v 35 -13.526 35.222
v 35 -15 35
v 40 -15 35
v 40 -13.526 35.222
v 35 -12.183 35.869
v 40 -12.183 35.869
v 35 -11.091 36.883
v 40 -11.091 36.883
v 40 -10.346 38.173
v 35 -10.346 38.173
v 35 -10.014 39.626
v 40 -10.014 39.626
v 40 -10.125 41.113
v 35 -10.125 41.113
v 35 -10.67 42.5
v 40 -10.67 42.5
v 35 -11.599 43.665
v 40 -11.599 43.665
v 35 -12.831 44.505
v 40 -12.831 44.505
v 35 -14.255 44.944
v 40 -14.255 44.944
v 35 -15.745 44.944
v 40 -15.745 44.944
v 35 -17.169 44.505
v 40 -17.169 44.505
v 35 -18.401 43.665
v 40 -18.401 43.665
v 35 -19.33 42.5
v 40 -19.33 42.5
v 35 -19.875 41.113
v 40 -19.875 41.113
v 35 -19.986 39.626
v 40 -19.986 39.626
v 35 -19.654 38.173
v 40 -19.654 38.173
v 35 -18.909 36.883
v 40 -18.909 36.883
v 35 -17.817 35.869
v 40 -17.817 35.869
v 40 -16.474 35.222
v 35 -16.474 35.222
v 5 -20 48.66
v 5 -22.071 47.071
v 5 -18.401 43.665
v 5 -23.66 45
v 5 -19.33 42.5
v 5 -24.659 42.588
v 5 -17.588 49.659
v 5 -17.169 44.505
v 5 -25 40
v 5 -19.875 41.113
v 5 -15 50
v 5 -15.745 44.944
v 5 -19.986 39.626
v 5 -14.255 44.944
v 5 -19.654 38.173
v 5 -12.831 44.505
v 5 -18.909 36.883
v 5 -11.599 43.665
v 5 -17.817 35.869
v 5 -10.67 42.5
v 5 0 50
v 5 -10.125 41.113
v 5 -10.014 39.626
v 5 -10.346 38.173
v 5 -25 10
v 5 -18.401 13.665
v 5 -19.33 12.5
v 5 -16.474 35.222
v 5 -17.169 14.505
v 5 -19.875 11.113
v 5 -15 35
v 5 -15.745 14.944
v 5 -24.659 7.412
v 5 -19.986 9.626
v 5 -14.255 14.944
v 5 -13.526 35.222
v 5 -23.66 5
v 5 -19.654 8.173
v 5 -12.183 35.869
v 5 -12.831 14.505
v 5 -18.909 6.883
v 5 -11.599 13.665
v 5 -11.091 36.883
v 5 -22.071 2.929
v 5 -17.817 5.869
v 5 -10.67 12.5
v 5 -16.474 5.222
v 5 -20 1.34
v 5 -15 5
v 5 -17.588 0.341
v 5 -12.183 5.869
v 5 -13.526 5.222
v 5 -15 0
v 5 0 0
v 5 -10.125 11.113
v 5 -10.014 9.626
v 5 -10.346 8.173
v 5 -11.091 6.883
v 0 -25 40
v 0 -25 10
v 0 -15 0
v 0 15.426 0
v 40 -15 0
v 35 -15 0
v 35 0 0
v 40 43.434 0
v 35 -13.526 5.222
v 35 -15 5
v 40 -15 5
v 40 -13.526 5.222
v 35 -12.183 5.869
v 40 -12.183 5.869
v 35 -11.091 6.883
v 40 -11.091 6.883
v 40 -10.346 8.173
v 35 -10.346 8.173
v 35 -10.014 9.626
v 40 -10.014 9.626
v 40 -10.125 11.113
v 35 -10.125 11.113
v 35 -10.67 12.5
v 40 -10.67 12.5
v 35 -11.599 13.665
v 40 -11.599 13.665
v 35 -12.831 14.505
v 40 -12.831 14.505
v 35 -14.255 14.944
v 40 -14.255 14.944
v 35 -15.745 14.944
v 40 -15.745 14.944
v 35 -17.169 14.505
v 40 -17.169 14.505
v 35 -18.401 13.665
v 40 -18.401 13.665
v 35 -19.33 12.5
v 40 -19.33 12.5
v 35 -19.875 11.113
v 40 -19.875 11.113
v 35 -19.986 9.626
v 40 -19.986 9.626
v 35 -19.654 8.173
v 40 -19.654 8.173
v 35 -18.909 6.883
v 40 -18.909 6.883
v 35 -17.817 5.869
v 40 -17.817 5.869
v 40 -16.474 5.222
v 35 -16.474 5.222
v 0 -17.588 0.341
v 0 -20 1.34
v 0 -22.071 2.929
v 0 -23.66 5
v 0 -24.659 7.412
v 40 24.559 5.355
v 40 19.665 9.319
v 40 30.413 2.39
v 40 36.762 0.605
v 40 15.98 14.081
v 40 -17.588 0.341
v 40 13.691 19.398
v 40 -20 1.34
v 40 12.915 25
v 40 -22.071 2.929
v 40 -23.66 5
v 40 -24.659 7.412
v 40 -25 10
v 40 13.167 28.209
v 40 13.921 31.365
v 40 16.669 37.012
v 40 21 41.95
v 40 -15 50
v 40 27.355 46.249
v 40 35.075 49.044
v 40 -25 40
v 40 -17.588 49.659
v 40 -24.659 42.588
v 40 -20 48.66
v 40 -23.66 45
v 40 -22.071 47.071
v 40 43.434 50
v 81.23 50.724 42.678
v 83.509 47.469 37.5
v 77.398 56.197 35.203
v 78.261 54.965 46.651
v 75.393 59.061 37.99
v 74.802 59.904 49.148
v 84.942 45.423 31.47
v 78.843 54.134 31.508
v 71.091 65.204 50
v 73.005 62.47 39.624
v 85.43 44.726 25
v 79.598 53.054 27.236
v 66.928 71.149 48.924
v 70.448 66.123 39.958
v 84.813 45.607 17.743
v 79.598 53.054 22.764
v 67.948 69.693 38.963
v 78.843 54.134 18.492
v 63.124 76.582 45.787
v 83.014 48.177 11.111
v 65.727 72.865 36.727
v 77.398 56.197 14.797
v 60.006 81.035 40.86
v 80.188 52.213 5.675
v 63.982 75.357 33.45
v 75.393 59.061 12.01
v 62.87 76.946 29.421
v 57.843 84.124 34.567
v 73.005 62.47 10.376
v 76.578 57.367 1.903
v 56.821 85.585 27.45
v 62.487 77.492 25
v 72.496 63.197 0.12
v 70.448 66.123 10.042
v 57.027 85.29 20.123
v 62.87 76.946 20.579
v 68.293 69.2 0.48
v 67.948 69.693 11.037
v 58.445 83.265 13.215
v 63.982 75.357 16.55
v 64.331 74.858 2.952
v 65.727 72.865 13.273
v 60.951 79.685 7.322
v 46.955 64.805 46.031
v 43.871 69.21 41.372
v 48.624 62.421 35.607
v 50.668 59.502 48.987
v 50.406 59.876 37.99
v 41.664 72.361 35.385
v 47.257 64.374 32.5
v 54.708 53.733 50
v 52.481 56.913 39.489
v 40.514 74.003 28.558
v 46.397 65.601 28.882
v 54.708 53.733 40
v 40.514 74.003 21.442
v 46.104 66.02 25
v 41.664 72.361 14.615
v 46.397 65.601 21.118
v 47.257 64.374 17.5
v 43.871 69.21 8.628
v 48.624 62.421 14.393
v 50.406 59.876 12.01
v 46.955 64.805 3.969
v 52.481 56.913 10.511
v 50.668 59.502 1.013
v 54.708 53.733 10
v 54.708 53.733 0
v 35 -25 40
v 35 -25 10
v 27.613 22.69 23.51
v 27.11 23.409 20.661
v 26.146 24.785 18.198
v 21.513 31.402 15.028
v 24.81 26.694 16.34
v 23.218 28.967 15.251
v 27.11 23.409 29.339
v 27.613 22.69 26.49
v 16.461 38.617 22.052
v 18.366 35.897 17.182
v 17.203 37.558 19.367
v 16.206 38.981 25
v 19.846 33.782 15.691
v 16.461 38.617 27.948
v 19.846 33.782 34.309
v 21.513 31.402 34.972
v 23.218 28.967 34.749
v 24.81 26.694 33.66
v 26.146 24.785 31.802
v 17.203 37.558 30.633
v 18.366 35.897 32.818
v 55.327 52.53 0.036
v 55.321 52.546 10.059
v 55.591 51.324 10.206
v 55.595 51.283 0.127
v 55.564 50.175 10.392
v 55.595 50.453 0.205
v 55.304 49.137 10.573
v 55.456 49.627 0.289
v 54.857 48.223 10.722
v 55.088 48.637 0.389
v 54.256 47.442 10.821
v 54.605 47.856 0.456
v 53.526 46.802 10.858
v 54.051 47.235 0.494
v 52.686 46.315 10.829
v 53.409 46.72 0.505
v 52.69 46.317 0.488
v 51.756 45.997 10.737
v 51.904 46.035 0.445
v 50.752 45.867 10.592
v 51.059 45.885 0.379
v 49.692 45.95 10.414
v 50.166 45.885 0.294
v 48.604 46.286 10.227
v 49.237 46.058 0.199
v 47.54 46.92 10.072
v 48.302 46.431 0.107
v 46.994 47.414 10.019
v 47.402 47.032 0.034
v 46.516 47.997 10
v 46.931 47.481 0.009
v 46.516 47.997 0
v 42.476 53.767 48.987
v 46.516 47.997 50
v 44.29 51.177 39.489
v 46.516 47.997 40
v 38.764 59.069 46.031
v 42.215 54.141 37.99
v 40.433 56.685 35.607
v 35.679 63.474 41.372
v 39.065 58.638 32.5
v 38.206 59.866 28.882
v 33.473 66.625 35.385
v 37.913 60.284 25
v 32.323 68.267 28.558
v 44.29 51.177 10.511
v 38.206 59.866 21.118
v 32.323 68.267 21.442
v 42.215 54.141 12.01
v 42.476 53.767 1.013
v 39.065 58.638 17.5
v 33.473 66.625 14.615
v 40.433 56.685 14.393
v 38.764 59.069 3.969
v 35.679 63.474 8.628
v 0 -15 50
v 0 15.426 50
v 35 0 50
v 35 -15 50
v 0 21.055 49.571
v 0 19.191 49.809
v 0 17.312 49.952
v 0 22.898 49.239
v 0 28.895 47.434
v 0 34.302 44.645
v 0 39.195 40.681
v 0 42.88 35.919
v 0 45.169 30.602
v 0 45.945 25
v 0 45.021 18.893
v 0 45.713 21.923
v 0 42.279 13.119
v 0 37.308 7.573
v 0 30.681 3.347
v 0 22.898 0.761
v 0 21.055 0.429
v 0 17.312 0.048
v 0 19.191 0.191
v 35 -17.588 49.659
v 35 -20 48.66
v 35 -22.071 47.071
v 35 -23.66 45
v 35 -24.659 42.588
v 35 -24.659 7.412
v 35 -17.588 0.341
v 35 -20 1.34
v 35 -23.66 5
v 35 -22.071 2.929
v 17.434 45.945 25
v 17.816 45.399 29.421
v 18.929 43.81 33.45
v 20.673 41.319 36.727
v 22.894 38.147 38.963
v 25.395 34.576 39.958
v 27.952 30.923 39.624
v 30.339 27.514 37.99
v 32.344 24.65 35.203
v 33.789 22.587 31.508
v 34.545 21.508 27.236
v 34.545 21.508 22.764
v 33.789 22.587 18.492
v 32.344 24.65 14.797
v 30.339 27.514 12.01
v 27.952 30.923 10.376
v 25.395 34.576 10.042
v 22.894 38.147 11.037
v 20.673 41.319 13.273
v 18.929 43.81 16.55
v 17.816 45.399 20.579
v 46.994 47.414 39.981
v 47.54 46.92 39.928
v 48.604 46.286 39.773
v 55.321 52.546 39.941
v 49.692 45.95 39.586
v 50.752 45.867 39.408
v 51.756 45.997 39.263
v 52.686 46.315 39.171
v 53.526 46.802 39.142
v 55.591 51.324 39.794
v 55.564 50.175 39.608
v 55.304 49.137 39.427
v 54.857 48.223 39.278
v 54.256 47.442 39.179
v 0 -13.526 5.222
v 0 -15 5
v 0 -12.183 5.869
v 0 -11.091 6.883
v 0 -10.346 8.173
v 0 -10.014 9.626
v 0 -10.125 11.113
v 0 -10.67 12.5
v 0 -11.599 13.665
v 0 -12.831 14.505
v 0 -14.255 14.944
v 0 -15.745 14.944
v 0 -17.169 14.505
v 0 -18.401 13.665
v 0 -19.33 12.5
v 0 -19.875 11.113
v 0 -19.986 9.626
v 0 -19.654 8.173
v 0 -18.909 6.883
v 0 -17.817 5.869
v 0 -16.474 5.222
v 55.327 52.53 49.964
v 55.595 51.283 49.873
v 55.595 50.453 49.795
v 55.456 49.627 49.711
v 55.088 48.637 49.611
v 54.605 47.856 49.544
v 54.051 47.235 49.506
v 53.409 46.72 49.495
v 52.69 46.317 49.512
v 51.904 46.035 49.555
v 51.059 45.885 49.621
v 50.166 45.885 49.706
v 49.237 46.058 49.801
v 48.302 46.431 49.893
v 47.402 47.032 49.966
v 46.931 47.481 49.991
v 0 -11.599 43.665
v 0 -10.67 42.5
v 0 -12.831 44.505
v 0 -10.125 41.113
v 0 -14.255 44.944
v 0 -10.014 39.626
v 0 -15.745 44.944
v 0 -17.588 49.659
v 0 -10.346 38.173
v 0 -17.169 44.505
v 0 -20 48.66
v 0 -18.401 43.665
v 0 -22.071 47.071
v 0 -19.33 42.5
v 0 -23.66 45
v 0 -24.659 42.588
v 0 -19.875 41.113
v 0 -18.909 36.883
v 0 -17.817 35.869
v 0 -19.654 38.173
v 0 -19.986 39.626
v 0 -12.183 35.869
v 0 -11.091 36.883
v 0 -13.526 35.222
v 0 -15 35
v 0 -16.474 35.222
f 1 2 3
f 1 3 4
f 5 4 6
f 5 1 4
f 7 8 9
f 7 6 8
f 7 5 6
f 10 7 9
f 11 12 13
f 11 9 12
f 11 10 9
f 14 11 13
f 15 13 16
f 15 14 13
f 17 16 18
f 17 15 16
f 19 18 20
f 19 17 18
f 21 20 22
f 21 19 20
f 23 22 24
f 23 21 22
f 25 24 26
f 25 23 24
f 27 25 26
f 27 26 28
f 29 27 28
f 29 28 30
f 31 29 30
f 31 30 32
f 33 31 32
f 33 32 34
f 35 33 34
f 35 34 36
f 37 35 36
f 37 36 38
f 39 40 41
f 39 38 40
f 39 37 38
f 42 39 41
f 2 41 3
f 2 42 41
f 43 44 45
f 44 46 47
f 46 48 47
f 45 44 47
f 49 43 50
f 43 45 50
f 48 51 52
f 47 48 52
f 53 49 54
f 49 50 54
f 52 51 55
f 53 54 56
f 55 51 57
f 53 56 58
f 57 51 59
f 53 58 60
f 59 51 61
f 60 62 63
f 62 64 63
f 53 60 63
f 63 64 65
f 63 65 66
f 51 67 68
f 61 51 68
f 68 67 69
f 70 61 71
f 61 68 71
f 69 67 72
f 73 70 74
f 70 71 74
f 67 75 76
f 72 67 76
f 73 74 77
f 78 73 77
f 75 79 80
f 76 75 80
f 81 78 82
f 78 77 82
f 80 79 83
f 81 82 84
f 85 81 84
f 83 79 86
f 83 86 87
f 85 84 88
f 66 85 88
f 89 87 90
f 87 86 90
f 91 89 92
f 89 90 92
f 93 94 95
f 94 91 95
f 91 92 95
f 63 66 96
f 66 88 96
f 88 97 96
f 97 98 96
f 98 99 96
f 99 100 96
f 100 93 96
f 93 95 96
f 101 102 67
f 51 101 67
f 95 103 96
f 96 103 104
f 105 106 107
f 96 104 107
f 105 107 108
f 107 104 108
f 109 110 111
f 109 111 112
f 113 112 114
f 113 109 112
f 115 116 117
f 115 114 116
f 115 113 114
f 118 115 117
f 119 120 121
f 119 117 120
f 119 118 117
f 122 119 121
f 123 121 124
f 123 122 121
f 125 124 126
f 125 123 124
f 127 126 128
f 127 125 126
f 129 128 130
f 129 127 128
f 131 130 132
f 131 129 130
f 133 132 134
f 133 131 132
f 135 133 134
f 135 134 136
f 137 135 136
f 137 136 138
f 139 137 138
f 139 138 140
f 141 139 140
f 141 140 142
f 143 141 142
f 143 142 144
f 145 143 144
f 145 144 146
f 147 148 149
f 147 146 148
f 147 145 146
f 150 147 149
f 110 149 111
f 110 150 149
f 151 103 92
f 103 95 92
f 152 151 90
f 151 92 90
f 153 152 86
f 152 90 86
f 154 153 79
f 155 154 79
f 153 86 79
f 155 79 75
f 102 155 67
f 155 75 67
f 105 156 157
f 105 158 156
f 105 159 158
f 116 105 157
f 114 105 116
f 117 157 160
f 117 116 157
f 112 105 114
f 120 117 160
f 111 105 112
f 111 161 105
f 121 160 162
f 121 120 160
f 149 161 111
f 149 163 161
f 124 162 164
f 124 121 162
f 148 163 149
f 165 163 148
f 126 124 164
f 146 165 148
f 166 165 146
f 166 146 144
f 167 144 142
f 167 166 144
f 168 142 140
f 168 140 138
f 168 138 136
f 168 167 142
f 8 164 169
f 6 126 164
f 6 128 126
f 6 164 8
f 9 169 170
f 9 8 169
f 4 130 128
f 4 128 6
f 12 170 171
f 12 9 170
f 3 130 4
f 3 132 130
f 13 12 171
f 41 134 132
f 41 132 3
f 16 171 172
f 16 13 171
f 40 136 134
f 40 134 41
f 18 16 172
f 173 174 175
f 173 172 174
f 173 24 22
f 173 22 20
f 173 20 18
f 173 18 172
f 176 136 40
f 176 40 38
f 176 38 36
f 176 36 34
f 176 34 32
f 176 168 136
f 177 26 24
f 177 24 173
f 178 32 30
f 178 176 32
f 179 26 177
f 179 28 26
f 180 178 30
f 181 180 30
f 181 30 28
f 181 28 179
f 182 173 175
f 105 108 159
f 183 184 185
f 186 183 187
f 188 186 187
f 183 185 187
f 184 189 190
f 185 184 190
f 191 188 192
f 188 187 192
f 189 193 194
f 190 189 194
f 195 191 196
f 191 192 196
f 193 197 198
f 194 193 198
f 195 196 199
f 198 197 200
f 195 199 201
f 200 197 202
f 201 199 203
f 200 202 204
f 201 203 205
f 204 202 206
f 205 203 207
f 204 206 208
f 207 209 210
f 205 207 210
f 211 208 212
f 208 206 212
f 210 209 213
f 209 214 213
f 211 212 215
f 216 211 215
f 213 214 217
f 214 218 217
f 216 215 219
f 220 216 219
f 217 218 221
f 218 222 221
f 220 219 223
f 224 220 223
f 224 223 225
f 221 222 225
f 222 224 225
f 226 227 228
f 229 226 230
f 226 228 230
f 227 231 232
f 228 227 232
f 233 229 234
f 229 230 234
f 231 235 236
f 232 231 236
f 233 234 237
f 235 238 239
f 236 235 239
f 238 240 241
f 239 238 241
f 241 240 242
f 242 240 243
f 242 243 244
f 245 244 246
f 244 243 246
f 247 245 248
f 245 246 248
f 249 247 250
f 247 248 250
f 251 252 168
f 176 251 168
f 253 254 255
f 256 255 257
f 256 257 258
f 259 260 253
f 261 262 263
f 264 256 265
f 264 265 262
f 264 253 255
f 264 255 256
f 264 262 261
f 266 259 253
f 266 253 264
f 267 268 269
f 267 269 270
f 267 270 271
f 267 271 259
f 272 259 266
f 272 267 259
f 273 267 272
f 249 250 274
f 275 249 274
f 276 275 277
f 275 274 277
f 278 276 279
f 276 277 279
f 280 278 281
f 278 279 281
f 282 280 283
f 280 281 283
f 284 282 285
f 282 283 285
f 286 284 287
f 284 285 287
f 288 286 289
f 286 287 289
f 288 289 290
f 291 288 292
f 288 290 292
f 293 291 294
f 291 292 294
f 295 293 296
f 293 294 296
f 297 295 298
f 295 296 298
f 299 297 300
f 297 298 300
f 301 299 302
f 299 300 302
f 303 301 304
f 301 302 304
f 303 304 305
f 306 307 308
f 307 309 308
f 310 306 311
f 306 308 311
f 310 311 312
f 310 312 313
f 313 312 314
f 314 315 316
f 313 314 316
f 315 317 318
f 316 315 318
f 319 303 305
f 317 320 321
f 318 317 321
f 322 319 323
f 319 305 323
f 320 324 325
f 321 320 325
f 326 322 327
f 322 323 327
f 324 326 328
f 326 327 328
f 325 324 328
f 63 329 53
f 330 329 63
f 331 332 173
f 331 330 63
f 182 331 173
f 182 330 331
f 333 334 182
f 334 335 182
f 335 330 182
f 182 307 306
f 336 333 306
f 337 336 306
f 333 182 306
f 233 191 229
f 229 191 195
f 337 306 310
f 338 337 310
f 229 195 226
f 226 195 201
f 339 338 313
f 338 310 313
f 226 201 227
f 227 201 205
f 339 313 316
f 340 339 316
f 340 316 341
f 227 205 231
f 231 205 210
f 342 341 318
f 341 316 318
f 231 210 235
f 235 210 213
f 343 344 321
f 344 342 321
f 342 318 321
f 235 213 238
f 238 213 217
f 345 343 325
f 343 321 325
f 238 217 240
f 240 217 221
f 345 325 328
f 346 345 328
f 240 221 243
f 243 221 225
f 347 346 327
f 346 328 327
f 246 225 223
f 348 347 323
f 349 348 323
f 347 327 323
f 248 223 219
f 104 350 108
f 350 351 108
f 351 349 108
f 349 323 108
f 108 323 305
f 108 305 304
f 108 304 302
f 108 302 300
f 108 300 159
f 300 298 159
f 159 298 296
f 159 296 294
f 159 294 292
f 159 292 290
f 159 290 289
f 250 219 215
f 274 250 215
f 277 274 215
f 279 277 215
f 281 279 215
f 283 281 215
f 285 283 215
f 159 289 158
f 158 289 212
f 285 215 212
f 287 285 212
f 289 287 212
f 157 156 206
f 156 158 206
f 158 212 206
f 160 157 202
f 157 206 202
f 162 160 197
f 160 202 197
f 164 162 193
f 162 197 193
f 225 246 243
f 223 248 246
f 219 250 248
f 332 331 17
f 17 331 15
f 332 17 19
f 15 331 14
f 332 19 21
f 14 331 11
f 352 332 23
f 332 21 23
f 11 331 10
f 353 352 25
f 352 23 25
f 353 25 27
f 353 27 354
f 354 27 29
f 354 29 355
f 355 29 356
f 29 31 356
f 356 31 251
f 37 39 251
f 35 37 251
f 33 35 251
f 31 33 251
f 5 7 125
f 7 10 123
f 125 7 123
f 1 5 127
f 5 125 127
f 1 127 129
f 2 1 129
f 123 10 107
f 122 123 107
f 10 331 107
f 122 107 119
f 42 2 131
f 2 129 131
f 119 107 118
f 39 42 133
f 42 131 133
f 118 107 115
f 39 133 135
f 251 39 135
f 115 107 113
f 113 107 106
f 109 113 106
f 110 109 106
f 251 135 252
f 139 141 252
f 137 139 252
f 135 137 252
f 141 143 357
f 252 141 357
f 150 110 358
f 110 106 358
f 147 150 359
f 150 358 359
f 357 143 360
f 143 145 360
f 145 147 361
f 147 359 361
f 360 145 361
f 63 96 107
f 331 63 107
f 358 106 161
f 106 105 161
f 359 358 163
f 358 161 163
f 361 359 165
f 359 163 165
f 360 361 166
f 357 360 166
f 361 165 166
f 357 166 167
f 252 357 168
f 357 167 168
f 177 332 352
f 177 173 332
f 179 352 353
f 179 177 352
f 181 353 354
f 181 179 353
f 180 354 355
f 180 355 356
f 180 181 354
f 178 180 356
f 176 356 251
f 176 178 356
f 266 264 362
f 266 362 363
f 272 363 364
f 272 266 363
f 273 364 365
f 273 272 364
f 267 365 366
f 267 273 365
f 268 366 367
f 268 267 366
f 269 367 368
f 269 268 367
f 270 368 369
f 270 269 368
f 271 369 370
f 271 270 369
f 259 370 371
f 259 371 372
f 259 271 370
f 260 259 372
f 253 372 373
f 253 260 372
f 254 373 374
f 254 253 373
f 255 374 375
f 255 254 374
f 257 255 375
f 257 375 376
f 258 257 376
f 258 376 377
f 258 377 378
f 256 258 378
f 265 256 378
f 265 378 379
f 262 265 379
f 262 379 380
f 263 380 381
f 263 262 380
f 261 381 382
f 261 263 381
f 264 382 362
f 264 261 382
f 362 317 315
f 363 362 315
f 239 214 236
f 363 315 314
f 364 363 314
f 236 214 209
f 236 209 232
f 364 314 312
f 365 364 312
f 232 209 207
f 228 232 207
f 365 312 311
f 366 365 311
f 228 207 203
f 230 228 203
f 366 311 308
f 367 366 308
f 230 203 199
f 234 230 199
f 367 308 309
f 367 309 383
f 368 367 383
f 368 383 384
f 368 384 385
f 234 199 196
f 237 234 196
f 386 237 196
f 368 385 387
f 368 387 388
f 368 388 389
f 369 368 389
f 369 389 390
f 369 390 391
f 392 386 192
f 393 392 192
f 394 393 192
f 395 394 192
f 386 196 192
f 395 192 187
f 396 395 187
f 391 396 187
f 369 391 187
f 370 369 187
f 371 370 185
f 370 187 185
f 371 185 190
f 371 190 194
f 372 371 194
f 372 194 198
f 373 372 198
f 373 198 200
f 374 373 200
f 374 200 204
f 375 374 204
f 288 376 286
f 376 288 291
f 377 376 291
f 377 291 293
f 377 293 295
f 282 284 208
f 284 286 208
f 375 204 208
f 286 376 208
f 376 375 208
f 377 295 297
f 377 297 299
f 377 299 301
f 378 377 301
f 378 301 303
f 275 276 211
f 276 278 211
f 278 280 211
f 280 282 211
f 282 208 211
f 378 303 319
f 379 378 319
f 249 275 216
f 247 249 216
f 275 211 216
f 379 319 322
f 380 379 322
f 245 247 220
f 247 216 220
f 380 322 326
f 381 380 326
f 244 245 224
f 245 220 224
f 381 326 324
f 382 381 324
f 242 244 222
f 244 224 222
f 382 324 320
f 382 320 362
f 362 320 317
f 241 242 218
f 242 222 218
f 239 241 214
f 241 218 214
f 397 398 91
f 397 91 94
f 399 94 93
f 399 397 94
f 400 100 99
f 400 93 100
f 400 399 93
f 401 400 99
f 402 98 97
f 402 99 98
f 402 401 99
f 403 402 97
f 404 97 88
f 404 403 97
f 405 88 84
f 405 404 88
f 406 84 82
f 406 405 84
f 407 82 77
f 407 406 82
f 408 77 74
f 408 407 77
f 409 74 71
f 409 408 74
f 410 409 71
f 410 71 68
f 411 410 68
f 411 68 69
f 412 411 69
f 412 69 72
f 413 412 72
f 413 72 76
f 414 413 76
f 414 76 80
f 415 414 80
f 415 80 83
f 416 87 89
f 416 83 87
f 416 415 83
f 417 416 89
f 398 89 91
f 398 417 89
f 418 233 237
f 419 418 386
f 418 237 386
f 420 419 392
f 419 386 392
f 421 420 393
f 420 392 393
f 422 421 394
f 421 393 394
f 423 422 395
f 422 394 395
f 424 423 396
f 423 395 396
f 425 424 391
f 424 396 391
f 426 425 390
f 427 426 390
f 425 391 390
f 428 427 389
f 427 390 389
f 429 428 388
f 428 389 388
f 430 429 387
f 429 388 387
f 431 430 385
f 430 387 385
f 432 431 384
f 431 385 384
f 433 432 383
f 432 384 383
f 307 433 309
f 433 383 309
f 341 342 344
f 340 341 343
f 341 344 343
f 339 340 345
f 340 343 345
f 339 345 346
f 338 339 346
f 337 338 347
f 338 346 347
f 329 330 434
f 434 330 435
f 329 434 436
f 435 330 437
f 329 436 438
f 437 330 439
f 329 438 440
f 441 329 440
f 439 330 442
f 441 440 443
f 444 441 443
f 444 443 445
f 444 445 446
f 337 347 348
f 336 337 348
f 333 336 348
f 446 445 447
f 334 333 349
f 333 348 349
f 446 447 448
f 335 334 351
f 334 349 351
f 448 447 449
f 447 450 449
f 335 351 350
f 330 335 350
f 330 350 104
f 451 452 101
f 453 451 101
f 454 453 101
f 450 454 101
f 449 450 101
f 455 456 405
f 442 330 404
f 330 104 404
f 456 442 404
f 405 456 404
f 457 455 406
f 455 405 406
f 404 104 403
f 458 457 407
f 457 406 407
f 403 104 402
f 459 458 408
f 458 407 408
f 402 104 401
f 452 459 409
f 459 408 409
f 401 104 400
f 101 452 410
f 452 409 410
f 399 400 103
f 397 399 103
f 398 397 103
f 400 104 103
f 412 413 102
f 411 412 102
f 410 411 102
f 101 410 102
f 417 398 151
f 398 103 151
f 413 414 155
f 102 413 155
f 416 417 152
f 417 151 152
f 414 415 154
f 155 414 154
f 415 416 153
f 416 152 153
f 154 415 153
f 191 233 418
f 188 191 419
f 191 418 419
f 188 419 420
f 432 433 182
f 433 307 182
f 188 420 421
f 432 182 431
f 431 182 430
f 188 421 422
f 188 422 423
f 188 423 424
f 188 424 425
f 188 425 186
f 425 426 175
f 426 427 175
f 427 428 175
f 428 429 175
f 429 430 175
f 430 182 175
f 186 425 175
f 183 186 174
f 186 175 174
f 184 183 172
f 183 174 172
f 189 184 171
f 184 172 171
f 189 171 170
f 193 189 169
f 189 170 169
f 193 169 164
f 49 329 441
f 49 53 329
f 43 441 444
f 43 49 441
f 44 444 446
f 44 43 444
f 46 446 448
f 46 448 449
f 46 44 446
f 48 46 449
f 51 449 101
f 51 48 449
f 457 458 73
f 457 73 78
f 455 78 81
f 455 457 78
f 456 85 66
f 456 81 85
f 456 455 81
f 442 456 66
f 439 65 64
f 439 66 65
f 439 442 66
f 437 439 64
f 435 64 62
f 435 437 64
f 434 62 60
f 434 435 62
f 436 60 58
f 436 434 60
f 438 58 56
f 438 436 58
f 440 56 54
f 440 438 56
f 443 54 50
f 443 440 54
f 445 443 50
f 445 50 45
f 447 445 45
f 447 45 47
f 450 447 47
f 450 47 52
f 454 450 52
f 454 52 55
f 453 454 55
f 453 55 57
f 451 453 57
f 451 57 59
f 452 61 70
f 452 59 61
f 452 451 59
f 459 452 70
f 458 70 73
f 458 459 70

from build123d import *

# Parameters (mm, degrees)
BOSS_EXTRUDE1_DEPTH     = 50
SKETCH2_R               = 15
CUT_EXTRUDE1_DEPTH      = 60
CHAMFER1_SIZE           = 5
CUT_EXTRUDE2_DEPTH      = 128.713132763
CUT_EXTRUDE2_DEPTH_BACK = 128.713132763
SKETCH3_R               = 5
FILLET2_R               = 10
FILLET3_R               = 25


with BuildPart() as part:
    # Sketch1 → Boss-Extrude1 (new body)
    with BuildSketch(Plane.XY):
        with BuildLine():
            Line((5, -25), (5, 0))
            Line((5, 0), (35, 0))
            Line((35, 0), (35, -25))
            Line((35, -25), (40, -25))
            Line((40, -25), (40, 0))
            Line((40, 0), (40, 12.914909334))
            Line((40, 12.914909334), (85.43033171, 44.72557006))
            Line((85.43033171, 44.72557006), (56.751509892, 85.683172275))
            Line((56.751509892, 85.683172275), (40.368469006, 74.211643548))
            Line((40.368469006, 74.211643548), (54.707879915, 53.732842441))
            ThreePointArc((54.707879915, 53.732842441), (53.480001875, 46.769200037), (46.516359472, 47.997078077))
            Line((46.516359472, 47.997078077), (32.176948563, 68.475879184))
            Line((32.176948563, 68.475879184), (0, 45.945337244))
            Line((0, 45.945337244), (0, 0))
            Line((0, 0), (0, -25))
            Line((0, -25), (5, -25))
        make_face()
    extrude(amount=BOSS_EXTRUDE1_DEPTH)

    # Sketch2 → Cut-Extrude1 (cut)
    with BuildSketch(Plane(origin=(78.338757076, 54.853388238, 0), x_dir=(0, 0, -1), z_dir=(0.8191520442889928, 0.5735764363510449, 0))):
        with Locations(Location((-25, 12.636216929, 0), (0, 0, 90))):
            Circle(SKETCH2_R)
    extrude(amount=-CUT_EXTRUDE1_DEPTH, mode=Mode.SUBTRACT)

    # Chamfer1
    chamfer1_edges = [part.edges().sort_by_distance(p)[0] for p in [
        (30.545444689, 18.502504322, 25),
    ]]
    chamfer(chamfer1_edges, length=CHAMFER1_SIZE)

    # Sketch3 → Cut-Extrude2 (cut, two sides: drawn at the far end of the back side and taken through both)
    with BuildSketch(Plane(origin=(5, 0, 0), x_dir=(0, 0, -1), z_dir=(1, 0, 0)).offset(-CUT_EXTRUDE2_DEPTH_BACK)):
        with Locations((-40, -15)):
            Circle(SKETCH3_R)
        with Locations((-10, -15)):
            Circle(SKETCH3_R)
    extrude(amount=CUT_EXTRUDE2_DEPTH + CUT_EXTRUDE2_DEPTH_BACK, mode=Mode.SUBTRACT)

    # Fillet2
    fillet2_edges = [part.edges().sort_by_distance(p)[0] for p in [
        (37.5, -25, 0),
        (2.5, -25, 0),
        (2.5, -25, 50),
        (37.5, -25, 50),
    ]]
    fillet(fillet2_edges, radius=FILLET2_R)

    # Fillet3
    # the kernel refuses this fillet: 25 mm, written as the material it takes off along each edge
    with BuildSketch(Plane(origin=(83.373951331, 104.324406456, 0), x_dir=(0.5735764363510446, -0.8191520442889929, 0), z_dir=(-0.8191520442889929, -0.5735764363510447, 0)), Plane(origin=(83.373951331, 104.324406456, 50), x_dir=(0, 0, -1), z_dir=(-0.8191520442889929, -0.5735764363510447, 0))) as fillet3_piece_1:
        with BuildLine():
            CenterArc((FILLET3_R, FILLET3_R), FILLET3_R, 180, 90)
            Line((0, FILLET3_R), (0, 0))
            Line((0, 0), (FILLET3_R, 0))
        make_face()
    extrude(amount=164.28080115, mode=Mode.SUBTRACT)
    with BuildSketch(Plane(origin=(107.94851266, 121.531699547, 0), x_dir=(0.573576436351046, -0.8191520442889918, 0), z_dir=(-0.8191520442889919, -0.5735764363510462, 0)), Plane(origin=(107.94851266, 121.531699547, 50), x_dir=(0, 0, -1), z_dir=(-0.8191520442889919, -0.5735764363510462, 0))) as fillet3_piece_2:
        with BuildLine():
            CenterArc((FILLET3_R, FILLET3_R), FILLET3_R, 180, 90)
            Line((0, FILLET3_R), (0, 0))
            Line((0, 0), (FILLET3_R, 0))
        make_face()
    extrude(amount=145, mode=Mode.SUBTRACT)
    with BuildSketch(Plane(origin=(-11.197002768, -22.933617938, 0), x_dir=(-0.5735764363510454, 0.8191520442889921, 0), z_dir=(0.8191520442889924, 0.5735764363510455, 0))) as fillet3_piece_3_section:
        with BuildLine():
            CenterArc((FILLET3_R, FILLET3_R), FILLET3_R, 180, 90)
            Line((0, FILLET3_R), (0, 0))
            Line((0, 0), (FILLET3_R, 0))
        make_face()
    fillet3_piece_3 = extrude(amount=180.46019451, mode=Mode.PRIVATE)
    fillet3_piece_3 = split(fillet3_piece_3, bisect_by=Plane(origin=(40, 25.184030637, 6.00422592), z_dir=(1, 0, 0)), keep=Keep.TOP, mode=Mode.PRIVATE)
    add(fillet3_piece_3, mode=Mode.SUBTRACT)
    with BuildSketch(Plane(origin=(-11.197002768, -22.933617938, 50), x_dir=(0, 0, -1), z_dir=(0.8191520442889924, 0.5735764363510455, 0))) as fillet3_piece_4_section:
        with BuildLine():
            CenterArc((FILLET3_R, FILLET3_R), FILLET3_R, 180, 90)
            Line((0, FILLET3_R), (0, 0))
            Line((0, 0), (FILLET3_R, 0))
        make_face()
    fillet3_piece_4 = extrude(amount=180.46019451, mode=Mode.PRIVATE)
    fillet3_piece_4 = split(fillet3_piece_4, bisect_by=Plane(origin=(40, 25.184030637, 43.99577408), z_dir=(1, 0, 0)), keep=Keep.TOP, mode=Mode.PRIVATE)
    add(fillet3_piece_4, mode=Mode.SUBTRACT)


solid = part.part
